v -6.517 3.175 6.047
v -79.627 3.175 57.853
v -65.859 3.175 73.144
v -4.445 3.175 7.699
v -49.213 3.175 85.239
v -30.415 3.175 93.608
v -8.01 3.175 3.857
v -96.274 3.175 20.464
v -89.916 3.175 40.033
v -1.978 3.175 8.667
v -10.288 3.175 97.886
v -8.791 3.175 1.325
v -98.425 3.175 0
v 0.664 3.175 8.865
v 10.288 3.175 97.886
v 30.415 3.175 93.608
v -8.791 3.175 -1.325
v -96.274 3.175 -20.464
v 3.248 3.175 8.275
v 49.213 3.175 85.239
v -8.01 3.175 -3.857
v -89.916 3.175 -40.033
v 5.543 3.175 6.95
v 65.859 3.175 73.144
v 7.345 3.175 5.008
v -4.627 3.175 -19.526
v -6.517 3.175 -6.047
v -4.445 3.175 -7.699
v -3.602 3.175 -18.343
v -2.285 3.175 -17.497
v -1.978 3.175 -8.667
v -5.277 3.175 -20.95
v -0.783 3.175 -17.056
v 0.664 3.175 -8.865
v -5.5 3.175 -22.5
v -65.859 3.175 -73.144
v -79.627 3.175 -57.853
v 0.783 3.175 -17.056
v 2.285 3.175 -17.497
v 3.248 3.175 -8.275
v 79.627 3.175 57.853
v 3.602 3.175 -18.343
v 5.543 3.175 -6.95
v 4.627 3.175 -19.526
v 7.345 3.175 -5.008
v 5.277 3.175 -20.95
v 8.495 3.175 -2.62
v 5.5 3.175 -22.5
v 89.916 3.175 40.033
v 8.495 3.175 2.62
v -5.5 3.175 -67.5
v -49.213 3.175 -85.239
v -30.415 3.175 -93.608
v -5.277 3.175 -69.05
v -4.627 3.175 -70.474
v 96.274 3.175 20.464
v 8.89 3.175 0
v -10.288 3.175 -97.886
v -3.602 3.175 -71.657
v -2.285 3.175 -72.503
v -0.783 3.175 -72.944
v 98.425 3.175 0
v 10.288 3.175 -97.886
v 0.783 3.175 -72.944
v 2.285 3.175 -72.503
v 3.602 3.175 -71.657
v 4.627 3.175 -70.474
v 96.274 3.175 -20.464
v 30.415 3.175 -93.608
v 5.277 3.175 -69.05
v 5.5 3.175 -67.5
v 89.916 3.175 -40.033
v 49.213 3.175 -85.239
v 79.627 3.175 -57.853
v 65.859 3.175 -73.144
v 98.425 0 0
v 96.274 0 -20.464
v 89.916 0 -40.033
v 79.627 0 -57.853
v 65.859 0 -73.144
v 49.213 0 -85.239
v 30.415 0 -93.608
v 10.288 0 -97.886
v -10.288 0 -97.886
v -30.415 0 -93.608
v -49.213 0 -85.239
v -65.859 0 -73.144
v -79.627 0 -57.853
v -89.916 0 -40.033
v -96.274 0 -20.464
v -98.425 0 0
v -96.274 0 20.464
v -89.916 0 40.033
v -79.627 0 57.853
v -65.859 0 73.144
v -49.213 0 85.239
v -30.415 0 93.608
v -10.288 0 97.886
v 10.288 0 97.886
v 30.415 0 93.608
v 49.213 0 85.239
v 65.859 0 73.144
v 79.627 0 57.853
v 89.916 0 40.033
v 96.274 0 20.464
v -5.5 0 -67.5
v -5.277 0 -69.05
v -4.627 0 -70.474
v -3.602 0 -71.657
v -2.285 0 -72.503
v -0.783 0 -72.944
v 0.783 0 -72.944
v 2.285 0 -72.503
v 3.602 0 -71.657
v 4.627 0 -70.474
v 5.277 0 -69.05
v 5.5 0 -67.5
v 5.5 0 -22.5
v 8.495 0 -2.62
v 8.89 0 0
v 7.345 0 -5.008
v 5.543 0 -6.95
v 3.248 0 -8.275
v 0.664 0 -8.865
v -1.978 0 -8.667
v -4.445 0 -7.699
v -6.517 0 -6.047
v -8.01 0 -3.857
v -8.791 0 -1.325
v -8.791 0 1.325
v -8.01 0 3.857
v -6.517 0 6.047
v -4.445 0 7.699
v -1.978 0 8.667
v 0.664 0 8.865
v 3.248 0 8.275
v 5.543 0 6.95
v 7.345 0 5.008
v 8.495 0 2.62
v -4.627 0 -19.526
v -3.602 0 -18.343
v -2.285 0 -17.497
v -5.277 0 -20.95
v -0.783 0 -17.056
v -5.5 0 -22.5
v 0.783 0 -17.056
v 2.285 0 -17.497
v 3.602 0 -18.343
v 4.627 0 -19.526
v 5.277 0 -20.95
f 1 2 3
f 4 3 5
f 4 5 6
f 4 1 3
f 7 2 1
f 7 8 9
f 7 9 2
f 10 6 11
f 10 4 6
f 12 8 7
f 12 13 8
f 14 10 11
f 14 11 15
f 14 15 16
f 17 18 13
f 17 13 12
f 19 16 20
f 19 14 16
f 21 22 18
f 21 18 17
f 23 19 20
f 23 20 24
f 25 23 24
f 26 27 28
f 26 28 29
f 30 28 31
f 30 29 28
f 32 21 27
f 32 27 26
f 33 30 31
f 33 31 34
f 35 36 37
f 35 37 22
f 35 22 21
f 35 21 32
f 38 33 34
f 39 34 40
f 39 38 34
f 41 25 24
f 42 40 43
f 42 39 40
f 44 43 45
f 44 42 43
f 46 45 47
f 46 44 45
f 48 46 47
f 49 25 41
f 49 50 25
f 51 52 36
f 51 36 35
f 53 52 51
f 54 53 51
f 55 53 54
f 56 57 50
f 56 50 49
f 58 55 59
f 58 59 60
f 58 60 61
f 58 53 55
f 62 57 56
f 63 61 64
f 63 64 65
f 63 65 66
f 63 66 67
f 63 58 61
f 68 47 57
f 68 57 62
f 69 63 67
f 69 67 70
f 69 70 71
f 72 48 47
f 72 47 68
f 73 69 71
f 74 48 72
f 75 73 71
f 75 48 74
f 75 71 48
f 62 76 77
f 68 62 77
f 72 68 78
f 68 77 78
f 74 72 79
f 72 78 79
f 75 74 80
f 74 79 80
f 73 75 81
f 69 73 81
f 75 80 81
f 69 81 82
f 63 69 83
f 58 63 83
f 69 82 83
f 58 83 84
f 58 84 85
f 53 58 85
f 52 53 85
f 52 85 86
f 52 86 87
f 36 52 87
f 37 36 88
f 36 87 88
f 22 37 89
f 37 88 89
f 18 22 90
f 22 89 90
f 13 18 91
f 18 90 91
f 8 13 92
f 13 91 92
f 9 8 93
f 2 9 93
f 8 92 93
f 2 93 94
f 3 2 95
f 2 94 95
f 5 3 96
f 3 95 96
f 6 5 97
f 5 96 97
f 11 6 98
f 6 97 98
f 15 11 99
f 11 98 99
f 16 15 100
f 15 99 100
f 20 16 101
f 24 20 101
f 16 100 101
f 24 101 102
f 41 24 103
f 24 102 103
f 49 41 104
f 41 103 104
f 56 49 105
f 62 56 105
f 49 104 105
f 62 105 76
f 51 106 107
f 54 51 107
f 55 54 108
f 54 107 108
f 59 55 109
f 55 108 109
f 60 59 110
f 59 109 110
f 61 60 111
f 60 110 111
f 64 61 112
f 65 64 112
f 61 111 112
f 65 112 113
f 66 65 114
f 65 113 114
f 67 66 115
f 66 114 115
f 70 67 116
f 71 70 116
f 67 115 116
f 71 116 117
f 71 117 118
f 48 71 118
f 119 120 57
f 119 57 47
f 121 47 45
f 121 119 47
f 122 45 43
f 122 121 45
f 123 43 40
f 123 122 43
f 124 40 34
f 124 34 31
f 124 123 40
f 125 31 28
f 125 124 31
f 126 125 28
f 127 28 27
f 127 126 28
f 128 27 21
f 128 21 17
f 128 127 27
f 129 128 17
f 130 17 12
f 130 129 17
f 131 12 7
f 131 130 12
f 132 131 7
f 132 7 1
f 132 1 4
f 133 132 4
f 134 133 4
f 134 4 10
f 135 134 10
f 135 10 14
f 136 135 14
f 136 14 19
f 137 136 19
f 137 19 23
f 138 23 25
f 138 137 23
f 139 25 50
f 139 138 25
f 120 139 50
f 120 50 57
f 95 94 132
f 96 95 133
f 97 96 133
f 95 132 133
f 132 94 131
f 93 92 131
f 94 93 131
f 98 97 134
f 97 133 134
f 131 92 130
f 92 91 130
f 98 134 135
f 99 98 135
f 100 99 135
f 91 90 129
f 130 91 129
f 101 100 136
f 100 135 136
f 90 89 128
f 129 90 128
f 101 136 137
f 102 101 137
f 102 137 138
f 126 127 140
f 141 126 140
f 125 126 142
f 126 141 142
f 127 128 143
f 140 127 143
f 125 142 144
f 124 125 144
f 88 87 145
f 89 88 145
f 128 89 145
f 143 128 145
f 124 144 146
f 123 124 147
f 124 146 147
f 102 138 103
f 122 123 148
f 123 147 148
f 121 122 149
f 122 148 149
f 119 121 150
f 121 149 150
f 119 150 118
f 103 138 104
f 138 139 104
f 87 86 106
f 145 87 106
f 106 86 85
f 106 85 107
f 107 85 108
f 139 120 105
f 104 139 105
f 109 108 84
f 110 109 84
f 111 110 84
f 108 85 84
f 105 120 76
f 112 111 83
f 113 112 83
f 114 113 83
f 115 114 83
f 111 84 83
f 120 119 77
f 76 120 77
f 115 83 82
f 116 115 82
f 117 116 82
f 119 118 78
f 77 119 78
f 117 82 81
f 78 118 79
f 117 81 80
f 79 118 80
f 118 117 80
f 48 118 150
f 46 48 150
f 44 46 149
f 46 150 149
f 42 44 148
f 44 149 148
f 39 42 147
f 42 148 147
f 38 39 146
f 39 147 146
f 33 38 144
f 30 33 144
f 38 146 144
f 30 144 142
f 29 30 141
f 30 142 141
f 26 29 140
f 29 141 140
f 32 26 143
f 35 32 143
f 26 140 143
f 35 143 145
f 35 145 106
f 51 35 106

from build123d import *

# Parameters (mm, degrees)
SKETCH1_R           = 98.425
SKETCH1_R_2         = 8.89
BOSS_EXTRUDE1_DEPTH = 3.175


with BuildPart() as part:
    # Sketch1 → Boss-Extrude1 (new body)
    with BuildSketch(Plane(origin=(0, 0, 0), x_dir=(1, 0, 0), z_dir=(0, 1, 0))):
        Circle(SKETCH1_R)
        Circle(SKETCH1_R_2, mode=Mode.SUBTRACT)
        with BuildLine():
            Line((-5.5, 22.5), (-5.5, 67.5))
            ThreePointArc((-5.5, 67.5), (0, 73), (5.5, 67.5))
            Line((5.5, 67.5), (5.5, 22.5))
            ThreePointArc((5.5, 22.5), (0, 17), (-5.5, 22.5))
        make_face(mode=Mode.SUBTRACT)
    extrude(amount=BOSS_EXTRUDE1_DEPTH)


solid = part.part
